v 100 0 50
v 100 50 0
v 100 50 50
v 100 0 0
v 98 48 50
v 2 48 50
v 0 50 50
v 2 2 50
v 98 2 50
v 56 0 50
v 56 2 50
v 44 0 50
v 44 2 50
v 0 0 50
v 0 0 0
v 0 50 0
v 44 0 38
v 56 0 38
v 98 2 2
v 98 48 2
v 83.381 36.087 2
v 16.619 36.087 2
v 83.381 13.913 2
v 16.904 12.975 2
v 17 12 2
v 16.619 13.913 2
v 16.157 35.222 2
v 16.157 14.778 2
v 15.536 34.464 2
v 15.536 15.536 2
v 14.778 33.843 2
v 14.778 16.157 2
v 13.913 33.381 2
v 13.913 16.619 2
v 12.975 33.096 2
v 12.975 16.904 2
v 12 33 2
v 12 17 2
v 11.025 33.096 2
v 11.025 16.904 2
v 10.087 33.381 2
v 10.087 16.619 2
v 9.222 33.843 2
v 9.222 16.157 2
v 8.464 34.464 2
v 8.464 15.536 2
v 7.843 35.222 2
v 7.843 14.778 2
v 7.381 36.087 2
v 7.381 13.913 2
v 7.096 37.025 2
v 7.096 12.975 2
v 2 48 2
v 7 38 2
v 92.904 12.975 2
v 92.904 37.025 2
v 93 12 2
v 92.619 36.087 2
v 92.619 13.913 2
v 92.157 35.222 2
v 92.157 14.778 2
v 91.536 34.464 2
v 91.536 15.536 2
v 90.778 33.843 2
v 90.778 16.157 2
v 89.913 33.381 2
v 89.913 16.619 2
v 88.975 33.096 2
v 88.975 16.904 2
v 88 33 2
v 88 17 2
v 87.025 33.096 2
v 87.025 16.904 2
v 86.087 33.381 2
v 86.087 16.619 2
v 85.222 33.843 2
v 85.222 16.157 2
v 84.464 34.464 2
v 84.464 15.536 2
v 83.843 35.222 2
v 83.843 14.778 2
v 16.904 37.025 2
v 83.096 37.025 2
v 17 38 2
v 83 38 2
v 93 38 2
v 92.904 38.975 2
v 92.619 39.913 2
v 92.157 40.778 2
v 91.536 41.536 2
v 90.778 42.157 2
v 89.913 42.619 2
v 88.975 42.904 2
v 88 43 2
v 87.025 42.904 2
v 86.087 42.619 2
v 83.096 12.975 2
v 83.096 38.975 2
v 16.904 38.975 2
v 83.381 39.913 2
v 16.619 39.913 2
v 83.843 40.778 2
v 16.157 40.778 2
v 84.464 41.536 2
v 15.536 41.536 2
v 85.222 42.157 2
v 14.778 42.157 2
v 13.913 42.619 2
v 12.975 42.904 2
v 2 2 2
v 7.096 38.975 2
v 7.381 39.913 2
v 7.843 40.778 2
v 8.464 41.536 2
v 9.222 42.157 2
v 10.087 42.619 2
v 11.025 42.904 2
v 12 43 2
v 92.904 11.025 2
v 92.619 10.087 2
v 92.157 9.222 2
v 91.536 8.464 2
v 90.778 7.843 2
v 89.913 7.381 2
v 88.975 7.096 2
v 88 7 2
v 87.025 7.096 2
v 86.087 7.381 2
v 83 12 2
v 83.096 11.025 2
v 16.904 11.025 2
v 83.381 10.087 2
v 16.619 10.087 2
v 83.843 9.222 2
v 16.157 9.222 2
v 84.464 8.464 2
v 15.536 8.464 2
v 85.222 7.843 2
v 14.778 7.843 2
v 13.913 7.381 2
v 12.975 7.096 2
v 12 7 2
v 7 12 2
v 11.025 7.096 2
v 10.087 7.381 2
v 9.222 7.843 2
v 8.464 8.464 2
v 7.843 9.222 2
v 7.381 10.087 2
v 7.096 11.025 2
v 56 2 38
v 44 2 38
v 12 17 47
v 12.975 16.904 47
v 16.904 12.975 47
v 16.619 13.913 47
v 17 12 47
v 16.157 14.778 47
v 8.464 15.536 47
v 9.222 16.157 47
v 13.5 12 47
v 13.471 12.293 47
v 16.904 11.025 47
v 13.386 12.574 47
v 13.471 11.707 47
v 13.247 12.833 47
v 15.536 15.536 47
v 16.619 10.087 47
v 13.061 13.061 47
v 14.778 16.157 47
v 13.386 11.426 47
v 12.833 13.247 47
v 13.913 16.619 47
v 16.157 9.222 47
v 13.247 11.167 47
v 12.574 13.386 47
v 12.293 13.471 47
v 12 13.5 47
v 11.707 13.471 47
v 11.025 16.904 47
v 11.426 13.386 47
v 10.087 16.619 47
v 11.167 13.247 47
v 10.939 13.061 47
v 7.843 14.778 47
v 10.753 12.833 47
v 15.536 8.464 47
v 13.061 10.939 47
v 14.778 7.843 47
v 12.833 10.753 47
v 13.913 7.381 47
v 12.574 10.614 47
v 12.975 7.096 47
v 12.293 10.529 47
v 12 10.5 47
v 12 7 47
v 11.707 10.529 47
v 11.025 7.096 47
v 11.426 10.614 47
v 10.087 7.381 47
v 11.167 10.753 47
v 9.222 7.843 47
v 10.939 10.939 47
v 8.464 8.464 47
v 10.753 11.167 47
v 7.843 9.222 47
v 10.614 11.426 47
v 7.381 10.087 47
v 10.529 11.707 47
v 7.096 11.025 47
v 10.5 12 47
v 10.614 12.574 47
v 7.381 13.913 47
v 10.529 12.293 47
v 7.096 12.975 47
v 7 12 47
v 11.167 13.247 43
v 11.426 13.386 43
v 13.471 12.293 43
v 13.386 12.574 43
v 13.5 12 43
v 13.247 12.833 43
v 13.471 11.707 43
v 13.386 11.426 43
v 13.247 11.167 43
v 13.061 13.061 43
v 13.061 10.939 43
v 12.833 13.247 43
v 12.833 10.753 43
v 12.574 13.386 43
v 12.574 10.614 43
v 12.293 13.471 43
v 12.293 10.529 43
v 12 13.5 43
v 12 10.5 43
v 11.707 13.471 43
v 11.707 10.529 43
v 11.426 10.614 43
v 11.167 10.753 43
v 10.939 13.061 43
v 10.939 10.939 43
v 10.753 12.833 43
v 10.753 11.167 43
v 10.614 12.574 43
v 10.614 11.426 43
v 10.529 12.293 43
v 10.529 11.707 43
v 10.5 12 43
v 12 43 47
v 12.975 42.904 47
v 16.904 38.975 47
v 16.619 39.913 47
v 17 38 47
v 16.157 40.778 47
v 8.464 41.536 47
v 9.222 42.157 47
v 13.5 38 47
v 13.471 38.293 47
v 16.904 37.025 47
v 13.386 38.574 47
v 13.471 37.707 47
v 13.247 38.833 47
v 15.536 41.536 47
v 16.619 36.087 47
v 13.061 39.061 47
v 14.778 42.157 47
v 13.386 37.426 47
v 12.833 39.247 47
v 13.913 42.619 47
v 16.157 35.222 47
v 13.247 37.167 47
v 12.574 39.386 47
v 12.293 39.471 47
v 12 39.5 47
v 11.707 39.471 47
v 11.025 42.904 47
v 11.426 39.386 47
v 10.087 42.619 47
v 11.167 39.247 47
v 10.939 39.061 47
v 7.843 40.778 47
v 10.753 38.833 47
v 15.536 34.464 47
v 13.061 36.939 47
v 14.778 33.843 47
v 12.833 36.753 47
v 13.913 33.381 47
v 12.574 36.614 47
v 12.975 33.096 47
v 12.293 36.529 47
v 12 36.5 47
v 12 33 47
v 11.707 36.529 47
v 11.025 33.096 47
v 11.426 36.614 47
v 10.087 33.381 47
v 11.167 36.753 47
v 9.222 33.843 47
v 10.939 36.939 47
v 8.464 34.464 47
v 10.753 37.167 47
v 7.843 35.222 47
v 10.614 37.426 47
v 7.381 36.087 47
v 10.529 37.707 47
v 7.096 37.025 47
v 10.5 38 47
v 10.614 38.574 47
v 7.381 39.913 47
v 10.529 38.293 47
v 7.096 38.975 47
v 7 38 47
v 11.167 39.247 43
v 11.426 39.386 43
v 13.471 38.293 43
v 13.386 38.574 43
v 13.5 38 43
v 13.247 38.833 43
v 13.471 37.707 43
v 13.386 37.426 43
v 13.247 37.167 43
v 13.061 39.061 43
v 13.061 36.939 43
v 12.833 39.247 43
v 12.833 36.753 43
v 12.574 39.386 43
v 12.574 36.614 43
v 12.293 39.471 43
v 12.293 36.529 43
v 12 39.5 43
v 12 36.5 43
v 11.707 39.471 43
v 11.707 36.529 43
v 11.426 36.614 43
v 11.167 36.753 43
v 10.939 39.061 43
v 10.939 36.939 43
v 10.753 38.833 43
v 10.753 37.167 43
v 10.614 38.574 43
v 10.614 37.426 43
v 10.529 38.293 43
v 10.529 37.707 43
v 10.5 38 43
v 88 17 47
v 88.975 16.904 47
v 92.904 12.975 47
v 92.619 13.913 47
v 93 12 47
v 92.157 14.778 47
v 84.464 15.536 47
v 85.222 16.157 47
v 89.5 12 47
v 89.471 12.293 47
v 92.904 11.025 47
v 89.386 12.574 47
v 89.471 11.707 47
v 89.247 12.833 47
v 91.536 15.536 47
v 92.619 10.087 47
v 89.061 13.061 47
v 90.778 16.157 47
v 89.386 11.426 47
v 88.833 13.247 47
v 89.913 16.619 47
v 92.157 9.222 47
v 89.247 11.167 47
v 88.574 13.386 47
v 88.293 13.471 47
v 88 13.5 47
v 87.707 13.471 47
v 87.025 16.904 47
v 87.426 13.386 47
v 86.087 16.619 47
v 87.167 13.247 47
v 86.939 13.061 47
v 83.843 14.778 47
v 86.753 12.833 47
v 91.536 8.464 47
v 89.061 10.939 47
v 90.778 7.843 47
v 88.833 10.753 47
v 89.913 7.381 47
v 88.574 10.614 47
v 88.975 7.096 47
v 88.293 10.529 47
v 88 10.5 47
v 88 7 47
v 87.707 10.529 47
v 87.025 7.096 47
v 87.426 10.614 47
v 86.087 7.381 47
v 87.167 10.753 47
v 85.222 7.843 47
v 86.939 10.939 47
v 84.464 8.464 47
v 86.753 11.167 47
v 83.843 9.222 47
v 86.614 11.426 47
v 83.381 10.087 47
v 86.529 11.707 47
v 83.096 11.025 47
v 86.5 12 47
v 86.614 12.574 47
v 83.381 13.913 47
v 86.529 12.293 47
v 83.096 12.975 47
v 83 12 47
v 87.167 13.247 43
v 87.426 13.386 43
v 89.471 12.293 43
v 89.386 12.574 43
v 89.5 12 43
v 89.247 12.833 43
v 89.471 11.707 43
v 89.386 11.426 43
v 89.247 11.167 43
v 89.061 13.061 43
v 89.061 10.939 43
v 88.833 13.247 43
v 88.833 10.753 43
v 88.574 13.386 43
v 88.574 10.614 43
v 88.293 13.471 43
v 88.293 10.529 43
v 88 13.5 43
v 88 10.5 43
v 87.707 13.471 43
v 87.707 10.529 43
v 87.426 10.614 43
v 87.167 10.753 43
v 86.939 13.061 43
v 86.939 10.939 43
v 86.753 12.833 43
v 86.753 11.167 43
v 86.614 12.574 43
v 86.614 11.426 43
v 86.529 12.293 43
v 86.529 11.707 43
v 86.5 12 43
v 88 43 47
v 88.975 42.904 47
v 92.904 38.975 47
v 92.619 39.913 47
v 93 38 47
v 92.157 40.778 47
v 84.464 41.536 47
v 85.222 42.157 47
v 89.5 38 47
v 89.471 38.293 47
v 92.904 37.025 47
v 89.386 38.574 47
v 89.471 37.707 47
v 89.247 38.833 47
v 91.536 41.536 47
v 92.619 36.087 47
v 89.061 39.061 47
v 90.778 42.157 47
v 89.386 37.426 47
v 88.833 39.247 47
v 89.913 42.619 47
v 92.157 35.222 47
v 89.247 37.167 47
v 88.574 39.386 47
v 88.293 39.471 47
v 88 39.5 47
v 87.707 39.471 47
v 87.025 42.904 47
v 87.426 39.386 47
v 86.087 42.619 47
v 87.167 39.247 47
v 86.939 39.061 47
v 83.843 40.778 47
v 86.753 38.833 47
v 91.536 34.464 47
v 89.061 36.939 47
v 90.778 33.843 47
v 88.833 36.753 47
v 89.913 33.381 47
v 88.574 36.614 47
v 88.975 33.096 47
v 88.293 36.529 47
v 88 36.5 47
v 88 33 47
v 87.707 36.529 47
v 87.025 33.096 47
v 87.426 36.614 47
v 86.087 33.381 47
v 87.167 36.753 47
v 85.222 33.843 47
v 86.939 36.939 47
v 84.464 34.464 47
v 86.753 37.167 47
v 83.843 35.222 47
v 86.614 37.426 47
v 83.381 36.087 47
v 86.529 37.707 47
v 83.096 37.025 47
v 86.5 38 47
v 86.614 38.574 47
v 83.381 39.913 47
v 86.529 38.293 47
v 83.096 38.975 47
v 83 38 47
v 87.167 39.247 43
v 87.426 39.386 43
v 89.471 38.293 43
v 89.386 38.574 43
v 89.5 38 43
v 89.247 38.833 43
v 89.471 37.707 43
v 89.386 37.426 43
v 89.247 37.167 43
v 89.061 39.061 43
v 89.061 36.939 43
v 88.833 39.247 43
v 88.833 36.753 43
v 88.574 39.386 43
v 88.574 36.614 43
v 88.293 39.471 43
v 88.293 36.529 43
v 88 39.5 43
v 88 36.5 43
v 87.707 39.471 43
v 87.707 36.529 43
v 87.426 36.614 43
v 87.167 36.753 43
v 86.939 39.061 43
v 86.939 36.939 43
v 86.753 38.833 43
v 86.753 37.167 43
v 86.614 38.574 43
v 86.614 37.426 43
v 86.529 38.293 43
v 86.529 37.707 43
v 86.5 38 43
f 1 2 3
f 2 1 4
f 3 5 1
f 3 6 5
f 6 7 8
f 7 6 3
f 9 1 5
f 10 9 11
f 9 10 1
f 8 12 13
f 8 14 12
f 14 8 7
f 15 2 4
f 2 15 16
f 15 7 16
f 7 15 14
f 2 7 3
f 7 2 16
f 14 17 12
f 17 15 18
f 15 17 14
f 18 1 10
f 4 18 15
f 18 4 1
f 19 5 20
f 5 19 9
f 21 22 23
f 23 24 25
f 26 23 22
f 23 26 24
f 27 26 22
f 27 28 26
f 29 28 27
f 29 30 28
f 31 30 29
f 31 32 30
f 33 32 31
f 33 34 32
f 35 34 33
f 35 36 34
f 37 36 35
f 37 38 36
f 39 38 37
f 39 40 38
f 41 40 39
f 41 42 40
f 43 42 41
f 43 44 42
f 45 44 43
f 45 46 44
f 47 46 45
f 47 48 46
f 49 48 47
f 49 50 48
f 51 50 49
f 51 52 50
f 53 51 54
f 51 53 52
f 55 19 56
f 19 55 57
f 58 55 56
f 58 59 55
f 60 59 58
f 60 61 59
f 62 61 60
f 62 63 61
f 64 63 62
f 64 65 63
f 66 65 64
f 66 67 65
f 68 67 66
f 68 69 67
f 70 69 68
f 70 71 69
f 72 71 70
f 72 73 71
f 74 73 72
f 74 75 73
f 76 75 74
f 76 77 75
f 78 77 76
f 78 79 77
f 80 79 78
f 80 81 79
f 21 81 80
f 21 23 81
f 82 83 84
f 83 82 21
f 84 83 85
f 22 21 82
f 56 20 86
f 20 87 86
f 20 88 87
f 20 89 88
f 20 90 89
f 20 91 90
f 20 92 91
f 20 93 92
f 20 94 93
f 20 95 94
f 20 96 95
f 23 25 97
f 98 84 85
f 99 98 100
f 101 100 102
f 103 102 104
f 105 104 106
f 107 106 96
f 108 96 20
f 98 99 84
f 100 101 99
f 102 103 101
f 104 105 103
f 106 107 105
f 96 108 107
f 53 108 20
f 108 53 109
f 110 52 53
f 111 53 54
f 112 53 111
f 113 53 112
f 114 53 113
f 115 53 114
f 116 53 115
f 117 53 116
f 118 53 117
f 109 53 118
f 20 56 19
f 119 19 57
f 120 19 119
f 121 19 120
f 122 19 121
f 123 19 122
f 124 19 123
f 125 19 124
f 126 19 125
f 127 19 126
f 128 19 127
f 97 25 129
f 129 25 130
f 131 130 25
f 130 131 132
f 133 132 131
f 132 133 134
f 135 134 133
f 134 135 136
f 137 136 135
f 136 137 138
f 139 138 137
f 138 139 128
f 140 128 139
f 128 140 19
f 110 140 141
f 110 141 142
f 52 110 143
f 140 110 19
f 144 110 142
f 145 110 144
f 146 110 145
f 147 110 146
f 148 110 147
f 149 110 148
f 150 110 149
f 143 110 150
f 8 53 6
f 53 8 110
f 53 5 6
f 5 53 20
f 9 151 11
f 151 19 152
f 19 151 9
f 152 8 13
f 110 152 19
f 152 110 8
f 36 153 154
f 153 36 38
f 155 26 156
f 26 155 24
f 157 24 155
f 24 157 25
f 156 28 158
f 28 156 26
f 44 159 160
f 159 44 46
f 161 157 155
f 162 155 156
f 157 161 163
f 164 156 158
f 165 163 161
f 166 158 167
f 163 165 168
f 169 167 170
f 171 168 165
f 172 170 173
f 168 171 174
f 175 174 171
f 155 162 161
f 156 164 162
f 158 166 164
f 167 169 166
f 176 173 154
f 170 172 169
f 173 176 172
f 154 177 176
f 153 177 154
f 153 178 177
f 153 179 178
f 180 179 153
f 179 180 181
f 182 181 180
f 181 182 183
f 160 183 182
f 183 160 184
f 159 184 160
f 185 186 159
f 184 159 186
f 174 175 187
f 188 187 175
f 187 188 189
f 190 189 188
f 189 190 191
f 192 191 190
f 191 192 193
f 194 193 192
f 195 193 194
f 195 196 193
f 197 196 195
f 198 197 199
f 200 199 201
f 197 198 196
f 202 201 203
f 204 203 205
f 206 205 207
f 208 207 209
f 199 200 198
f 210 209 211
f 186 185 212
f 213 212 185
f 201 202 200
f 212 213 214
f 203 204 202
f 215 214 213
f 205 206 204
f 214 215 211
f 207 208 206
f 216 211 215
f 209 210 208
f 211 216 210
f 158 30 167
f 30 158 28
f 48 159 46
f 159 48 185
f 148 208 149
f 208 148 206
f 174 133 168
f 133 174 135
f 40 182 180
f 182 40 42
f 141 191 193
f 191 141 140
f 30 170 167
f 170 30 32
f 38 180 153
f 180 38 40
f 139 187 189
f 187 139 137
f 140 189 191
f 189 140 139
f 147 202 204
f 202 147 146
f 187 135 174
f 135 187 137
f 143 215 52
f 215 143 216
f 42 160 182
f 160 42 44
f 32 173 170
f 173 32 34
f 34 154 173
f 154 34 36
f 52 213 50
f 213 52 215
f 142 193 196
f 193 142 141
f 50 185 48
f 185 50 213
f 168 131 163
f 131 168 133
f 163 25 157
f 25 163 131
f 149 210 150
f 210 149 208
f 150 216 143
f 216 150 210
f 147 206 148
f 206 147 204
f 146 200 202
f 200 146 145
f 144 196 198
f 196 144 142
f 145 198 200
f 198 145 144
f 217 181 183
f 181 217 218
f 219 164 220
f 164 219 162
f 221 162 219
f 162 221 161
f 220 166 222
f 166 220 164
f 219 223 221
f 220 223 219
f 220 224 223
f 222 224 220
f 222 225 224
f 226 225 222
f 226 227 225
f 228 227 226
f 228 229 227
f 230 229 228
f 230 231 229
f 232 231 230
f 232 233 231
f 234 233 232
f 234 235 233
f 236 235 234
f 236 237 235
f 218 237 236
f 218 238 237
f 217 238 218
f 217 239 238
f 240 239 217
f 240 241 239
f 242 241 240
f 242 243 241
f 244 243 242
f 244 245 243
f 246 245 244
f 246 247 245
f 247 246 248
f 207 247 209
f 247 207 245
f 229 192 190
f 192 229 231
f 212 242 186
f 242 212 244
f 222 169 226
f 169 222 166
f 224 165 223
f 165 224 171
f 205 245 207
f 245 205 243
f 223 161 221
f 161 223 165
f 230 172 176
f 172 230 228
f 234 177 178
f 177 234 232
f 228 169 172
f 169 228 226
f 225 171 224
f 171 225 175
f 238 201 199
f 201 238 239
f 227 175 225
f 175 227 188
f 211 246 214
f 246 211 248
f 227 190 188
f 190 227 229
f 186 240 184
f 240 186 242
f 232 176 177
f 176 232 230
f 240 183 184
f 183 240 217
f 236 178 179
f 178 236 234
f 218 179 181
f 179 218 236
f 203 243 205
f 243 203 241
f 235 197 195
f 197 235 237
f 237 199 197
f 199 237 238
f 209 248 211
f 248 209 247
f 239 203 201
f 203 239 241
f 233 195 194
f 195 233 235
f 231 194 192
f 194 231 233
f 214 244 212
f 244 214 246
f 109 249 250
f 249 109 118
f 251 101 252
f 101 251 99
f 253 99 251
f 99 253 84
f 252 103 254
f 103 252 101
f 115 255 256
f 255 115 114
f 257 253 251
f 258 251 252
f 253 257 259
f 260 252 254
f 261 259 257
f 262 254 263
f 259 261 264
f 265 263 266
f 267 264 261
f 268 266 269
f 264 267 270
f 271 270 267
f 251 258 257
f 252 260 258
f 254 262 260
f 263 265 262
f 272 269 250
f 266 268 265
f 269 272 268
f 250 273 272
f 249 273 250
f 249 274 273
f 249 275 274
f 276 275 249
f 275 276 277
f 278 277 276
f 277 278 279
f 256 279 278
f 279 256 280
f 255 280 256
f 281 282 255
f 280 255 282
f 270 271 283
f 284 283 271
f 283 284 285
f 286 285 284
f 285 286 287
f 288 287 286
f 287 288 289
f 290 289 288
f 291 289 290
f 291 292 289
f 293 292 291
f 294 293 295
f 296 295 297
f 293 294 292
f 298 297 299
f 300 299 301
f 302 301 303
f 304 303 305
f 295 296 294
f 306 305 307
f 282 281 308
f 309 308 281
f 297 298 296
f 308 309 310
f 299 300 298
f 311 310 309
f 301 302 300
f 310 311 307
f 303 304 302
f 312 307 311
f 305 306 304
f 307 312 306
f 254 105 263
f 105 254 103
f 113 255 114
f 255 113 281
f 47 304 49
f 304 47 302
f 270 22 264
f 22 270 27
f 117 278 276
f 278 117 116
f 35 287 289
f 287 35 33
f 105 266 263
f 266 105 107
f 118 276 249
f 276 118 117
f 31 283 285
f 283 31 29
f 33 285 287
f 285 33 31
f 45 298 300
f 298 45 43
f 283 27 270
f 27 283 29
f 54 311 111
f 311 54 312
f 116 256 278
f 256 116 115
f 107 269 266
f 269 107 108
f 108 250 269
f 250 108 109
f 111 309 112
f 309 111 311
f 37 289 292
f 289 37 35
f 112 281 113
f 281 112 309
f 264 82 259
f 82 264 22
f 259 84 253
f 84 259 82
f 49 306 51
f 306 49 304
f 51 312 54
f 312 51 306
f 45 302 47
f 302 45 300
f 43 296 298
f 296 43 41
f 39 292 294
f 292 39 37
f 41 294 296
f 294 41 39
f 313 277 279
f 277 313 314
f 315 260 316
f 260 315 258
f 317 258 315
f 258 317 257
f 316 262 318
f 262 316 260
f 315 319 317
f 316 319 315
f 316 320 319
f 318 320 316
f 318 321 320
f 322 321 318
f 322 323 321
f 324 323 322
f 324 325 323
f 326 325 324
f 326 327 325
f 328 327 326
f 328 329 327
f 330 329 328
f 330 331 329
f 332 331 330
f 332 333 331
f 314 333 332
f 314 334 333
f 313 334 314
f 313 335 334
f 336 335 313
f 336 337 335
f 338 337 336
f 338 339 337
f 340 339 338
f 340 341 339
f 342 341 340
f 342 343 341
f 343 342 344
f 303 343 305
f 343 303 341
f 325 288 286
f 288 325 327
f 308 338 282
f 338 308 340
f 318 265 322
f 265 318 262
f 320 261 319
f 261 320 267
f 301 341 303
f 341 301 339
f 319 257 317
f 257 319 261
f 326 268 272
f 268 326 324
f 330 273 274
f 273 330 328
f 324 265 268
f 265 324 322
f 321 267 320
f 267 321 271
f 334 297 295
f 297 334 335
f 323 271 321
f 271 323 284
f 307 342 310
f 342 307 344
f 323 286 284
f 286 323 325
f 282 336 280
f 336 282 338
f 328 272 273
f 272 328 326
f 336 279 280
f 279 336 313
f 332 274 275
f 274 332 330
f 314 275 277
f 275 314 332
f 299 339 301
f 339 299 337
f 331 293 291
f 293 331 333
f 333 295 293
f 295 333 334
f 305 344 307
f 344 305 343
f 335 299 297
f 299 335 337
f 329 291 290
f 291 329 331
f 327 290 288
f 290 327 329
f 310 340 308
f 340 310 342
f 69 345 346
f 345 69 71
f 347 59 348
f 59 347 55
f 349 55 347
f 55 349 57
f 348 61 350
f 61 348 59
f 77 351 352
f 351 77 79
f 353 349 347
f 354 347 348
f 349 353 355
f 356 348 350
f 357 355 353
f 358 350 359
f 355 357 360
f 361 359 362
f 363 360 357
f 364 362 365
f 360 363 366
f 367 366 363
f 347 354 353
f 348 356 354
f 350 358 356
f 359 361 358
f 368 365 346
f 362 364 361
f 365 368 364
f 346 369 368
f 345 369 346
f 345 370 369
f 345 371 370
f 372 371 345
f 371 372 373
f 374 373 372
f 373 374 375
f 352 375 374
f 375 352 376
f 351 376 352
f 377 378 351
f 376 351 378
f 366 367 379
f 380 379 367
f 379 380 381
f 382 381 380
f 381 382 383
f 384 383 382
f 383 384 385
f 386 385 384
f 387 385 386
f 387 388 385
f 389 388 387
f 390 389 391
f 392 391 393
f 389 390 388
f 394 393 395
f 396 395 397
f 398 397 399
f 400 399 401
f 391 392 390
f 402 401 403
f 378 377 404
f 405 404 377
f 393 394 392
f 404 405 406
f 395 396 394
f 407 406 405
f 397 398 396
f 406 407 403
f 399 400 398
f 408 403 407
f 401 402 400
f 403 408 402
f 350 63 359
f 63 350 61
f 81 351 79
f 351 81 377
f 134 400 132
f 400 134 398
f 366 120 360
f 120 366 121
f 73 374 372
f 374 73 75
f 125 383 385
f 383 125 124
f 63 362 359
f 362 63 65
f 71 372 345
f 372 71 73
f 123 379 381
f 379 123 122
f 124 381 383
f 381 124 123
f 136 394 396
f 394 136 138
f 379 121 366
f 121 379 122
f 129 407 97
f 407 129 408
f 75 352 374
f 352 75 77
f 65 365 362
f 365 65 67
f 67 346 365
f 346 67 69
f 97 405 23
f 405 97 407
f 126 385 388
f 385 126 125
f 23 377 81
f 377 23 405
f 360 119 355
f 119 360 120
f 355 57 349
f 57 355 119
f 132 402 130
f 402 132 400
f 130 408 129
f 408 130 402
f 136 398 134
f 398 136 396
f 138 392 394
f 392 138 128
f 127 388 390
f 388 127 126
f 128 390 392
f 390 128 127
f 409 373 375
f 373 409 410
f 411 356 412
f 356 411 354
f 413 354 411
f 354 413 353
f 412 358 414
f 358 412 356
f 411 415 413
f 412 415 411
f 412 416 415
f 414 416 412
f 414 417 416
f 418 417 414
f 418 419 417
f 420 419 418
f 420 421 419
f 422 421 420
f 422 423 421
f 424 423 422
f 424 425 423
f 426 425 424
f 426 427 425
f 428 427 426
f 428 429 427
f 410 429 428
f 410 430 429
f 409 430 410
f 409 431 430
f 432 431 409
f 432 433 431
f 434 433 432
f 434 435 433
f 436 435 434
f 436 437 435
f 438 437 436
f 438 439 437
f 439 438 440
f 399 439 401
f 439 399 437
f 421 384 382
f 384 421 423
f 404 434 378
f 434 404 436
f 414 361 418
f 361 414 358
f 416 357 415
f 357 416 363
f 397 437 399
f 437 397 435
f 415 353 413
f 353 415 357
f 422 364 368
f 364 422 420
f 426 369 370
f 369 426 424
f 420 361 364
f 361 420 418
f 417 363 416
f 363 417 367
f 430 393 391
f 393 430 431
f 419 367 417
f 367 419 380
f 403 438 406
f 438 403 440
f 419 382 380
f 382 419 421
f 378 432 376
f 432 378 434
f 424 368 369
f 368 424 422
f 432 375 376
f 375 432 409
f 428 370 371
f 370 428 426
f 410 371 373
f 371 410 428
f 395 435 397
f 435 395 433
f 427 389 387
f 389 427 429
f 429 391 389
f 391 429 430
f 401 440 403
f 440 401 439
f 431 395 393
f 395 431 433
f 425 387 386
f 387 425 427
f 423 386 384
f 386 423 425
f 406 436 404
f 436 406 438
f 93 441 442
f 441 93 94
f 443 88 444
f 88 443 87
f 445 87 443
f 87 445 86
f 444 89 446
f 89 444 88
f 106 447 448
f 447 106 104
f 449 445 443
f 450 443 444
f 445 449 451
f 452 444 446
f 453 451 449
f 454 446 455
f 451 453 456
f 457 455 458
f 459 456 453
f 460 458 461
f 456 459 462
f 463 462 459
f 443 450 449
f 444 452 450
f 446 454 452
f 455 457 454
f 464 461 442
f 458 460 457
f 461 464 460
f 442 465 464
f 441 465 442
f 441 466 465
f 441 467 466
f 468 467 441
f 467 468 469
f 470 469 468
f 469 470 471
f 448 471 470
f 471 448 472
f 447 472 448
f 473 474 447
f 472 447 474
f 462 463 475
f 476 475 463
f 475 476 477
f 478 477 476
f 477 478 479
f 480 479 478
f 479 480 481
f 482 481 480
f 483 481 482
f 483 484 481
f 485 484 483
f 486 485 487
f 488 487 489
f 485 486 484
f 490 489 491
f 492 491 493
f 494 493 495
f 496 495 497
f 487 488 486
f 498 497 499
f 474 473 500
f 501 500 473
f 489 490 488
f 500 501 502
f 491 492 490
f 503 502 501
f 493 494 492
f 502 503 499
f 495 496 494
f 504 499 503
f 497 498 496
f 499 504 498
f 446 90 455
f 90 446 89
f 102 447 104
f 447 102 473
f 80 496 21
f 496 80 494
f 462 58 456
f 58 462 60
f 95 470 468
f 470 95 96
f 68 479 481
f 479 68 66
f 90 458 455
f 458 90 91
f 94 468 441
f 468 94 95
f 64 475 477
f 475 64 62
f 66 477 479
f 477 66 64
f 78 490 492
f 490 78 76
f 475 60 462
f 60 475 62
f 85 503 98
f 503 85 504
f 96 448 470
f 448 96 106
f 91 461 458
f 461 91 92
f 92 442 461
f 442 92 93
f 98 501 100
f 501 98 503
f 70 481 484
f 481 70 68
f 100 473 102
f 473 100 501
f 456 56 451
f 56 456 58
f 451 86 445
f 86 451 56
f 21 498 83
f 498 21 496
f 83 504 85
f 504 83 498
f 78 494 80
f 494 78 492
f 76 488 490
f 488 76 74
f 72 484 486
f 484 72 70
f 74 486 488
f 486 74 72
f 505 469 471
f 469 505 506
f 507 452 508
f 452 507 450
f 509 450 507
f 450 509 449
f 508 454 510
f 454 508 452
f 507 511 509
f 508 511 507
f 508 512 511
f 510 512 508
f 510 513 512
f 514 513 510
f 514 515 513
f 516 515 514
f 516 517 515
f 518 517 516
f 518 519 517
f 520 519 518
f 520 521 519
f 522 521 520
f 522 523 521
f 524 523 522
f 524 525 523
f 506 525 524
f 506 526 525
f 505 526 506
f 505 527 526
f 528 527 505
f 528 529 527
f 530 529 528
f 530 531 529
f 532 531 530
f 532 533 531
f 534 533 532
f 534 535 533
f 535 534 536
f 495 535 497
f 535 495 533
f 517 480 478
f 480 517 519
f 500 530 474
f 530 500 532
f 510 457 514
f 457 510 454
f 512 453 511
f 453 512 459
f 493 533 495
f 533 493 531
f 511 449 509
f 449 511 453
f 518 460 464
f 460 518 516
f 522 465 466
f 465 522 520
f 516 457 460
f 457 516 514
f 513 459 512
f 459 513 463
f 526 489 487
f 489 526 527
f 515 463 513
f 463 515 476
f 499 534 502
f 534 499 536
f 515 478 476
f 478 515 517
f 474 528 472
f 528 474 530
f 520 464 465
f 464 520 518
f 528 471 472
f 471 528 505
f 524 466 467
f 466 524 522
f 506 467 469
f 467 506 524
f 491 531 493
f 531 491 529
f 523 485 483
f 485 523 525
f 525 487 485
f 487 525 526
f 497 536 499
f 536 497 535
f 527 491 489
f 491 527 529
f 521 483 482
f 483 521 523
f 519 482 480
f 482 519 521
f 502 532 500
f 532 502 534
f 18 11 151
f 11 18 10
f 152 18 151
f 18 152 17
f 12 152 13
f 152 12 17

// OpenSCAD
$fn = 32;

// ----------------------------------------------------------------------
// Enclosure box: both enclosure
// ----------------------------------------------------------------------

// --- parameters (mm) ---
box_l = 100;              // outer length, X
box_w = 50;               // outer width, Y
box_h = 50;               // outer height
wall_t = 2;               // wall thickness
boss_r = 5;               // corner boss radius
hole_r = 1.5;             // boss screw hole radius
boss_in = 12;             // boss inset from the corners
notch_w = 12;             // cable notch width
notch_h = 12;             // cable notch height
fit_tol = 0.05;           // tolerance for press fits, mm
free_tol = 0.2;           // tolerance for clearance fits, mm

inner_h = box_h - wall_t;  // cavity depth
boss_h = inner_h - 2;  // corner boss height

difference() {
  union() {
    difference() {
      cube([box_l, box_w, box_h]);
      translate([wall_t, wall_t, wall_t])
        cube([box_l - 2 * wall_t, box_w - 2 * wall_t, box_h]);
    }
    for (sx = [0, 1], sy = [0, 1])
      translate([sx ? box_l - boss_in : boss_in,
                 sy ? box_w - boss_in : boss_in, wall_t - 1])
        difference() {
          cylinder(r = boss_r, h = boss_h);
          translate([0, 0, boss_h - 4])
            cylinder(r = hole_r, h = 5);
        }
  }
  translate([box_l / 2 - notch_w / 2, -1, box_h - notch_h])
    cube([notch_w, wall_t + 2, notch_h + 1]);
}
